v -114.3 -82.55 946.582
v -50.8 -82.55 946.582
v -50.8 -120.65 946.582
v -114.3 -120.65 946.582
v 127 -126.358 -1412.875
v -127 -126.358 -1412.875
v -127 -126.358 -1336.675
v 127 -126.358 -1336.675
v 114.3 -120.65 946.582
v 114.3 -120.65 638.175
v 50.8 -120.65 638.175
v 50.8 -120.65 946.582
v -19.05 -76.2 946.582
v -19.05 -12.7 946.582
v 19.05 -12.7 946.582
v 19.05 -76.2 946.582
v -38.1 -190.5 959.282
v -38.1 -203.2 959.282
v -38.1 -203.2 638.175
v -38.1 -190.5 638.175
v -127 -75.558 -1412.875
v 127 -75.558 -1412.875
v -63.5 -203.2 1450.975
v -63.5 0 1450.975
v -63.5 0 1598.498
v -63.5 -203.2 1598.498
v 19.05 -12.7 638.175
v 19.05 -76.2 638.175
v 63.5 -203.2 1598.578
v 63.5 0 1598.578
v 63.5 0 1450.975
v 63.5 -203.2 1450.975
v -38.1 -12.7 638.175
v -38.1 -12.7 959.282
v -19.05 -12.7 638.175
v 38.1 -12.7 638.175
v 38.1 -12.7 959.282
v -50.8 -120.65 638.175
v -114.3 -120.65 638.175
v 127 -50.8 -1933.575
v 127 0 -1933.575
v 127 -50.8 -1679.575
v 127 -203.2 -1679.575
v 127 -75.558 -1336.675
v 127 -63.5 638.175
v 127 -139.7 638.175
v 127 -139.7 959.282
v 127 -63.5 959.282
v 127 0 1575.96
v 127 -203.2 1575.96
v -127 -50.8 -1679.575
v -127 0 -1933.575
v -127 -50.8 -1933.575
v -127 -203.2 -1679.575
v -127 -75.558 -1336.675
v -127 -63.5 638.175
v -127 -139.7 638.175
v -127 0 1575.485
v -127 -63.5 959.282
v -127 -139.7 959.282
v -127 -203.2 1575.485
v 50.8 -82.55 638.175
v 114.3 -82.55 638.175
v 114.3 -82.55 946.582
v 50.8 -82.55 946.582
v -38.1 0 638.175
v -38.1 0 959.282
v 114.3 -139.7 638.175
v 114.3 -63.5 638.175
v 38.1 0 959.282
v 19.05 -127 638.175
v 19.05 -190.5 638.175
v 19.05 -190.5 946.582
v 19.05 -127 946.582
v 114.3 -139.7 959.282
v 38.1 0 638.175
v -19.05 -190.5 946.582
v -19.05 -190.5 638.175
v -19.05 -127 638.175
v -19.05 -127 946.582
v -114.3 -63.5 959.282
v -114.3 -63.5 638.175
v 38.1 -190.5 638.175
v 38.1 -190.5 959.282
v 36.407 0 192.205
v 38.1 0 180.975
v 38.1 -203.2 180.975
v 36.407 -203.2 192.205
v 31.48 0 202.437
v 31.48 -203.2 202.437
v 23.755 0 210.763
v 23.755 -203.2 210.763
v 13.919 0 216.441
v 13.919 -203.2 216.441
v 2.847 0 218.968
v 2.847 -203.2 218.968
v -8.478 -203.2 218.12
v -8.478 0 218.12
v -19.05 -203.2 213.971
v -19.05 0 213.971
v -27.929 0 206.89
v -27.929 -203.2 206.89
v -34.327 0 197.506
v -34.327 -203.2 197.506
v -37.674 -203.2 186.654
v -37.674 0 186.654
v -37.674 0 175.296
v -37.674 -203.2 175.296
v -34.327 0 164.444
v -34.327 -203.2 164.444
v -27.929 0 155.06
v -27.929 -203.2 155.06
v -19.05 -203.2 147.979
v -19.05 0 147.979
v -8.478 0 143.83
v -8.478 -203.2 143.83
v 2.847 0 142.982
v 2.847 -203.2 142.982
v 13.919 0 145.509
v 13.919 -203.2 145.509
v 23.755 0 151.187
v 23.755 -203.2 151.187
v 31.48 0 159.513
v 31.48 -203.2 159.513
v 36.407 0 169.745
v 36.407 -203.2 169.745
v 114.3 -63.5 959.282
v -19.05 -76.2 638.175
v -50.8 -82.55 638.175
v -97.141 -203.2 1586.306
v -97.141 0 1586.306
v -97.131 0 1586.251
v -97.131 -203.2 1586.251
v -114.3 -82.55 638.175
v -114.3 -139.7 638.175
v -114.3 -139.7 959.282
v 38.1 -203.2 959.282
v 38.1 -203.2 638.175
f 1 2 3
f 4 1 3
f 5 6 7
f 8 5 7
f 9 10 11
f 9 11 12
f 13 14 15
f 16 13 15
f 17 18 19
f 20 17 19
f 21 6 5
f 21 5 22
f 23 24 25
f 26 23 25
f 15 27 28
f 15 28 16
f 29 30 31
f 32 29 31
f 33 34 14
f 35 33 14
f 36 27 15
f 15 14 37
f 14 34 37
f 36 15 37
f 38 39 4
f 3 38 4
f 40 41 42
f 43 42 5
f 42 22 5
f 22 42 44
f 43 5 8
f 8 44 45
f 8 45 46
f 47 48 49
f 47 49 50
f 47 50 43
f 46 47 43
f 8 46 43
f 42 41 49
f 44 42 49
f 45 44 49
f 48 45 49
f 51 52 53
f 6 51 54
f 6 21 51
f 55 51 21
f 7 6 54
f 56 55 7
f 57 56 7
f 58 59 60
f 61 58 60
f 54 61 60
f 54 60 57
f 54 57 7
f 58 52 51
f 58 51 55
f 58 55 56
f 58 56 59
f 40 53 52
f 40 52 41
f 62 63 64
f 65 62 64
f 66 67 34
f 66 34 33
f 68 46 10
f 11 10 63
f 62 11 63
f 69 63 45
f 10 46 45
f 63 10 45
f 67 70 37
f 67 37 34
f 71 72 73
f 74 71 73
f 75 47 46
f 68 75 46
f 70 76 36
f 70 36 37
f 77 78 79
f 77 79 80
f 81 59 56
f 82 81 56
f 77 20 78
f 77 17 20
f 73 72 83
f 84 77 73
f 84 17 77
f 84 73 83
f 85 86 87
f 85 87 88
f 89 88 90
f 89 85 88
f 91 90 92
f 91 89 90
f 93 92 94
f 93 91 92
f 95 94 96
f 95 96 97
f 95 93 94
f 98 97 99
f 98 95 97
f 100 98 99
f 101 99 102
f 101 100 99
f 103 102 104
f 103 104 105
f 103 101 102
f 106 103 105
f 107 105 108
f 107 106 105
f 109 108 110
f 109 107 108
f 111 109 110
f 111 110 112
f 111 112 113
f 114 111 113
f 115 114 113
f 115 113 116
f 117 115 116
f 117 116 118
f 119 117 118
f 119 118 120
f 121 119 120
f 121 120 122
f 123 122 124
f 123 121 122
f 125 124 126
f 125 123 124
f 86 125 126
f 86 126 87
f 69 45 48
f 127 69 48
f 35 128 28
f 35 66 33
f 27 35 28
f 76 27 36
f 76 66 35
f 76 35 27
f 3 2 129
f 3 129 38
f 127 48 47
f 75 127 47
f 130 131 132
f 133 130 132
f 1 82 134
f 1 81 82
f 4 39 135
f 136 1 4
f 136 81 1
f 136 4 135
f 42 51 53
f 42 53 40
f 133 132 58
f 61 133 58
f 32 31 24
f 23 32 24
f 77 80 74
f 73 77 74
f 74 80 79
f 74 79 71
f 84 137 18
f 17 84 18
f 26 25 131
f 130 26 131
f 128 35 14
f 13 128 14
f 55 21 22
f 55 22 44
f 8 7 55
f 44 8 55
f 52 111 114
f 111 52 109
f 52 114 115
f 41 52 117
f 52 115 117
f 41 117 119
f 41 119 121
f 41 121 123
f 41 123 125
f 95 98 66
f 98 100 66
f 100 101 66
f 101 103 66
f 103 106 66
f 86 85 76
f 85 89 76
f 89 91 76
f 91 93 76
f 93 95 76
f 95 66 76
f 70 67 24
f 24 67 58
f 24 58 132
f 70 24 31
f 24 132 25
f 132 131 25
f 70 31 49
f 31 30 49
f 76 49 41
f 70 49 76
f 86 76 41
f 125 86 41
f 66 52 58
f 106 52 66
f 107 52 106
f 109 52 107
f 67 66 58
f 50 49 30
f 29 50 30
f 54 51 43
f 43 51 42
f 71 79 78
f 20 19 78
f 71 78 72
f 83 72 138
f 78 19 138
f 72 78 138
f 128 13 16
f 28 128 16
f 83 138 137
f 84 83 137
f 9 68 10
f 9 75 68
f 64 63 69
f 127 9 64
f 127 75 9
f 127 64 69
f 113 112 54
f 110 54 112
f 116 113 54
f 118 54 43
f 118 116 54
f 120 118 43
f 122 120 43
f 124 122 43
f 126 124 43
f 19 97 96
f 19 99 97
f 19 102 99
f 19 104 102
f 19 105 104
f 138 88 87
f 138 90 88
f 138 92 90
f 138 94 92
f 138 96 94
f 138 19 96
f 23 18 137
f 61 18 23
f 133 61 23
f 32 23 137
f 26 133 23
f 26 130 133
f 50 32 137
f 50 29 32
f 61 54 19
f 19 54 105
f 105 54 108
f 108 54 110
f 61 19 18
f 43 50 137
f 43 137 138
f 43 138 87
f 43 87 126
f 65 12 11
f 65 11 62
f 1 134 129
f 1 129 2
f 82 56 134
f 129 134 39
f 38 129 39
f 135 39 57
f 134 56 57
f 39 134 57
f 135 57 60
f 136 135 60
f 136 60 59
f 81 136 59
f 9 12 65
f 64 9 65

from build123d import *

# Parameters (mm, degrees)
F0_R      = 38.1
F0_W      = 38.1
F0_H      = 308.4068
F1_DEPTH  = 203.2
F2_DEPTH  = 76.2
F3_W      = 38.1
F3_H      = 308.4068
F4_DEPTH  = 76.2
F5_DEPTH  = 12.7
F6_DEPTH  = 12.7
F7_W      = 38.1
F7_H      = 308.4068
F8_DEPTH  = 76.2
F9_DEPTH  = 12.7
F10_W     = 38.1
F10_H     = 308.4068
F11_DEPTH = 76.2
F12_DEPTH = 12.7
F7_W_2    = 50.8
F7_H_2    = 76.2
F13_DEPTH = 254
F14_W     = 254
F14_H     = 50.8
F15_DEPTH = 254


# Not quite as in the source:
# - a feature names something its author has since deleted; it is built from what else it names


with BuildPart() as f1:
    # F0 (on Front) → F1 (new body)
    with BuildSketch(Plane.XZ):
        Polygon((-97.1309603494, 1586.2505768385), (-127, 1575.484752655), (-127, -1679.575), (127, -1679.575), (127, 1575.9600688261), (63.5, 1598.5777378082), (63.5, 1450.975), (-63.5, 1450.975), (-63.5, 1598.4984636307), (-97.1411935326, 1586.3062005624), align=None)
        with Locations((0, 180.975)):
            Circle(F0_R, mode=Mode.SUBTRACT)
        Polygon((19.05, 638.175), (-19.05, 638.175), (-38.1, 638.175), (-38.1, 959.2818), (38.1, 959.2818), (38.1, 638.175), align=None, mode=Mode.SUBTRACT)
        with Locations((0, 792.3784)):
            Rectangle(F0_W, F0_H)
        Polygon((-19.05, 638.175), (-19.05, 946.5818), (19.05, 946.5818), (19.05, 638.175), (38.1, 638.175), (38.1, 959.2818), (-38.1, 959.2818), (-38.1, 638.175), align=None)
    extrude(amount=F1_DEPTH)

    # F0 (on Front) → F2 (cut)
    with BuildSketch(Plane.XZ):
        with Locations((0, 792.3784)):
            Rectangle(F0_W, F0_H)
    extrude(amount=F2_DEPTH, mode=Mode.SUBTRACT)

    # F3 (on face) → F4 (cut)
    with BuildSketch(Plane.XZ.offset(203.2)):
        with Locations((0, 792.3784)):
            Rectangle(F3_W, F3_H)
    extrude(amount=-F4_DEPTH, mode=Mode.SUBTRACT)

    # F3 (on face) → F5 (cut)
    with BuildSketch(Plane.XZ.offset(203.2)):
        Polygon((-38.1, 638.175), (-19.05, 638.175), (-19.05, 946.5818), (19.05, 946.5818), (19.05, 638.175), (38.1, 638.175), (38.1, 959.2818), (-38.1, 959.2818), align=None)
    extrude(amount=-F5_DEPTH, mode=Mode.SUBTRACT)

    # F0 (on Front) → F6 (cut)
    with BuildSketch(Plane.XZ):
        Polygon((-19.05, 638.175), (-19.05, 946.5818), (19.05, 946.5818), (19.05, 638.175), (38.1, 638.175), (38.1, 959.2818), (-38.1, 959.2818), (-38.1, 638.175), align=None)
    extrude(amount=F6_DEPTH, mode=Mode.SUBTRACT)

    # F7 (on face) → F8 (cut)
    with BuildSketch(Plane.YZ.offset(127)):
        with Locations((-101.6, 792.3784)):
            Rectangle(F7_W, F7_H)
    extrude(amount=-F8_DEPTH, mode=Mode.SUBTRACT)

    # F7 (on face) → F9 (cut)
    with BuildSketch(Plane.YZ.offset(127)):
        Polygon((-139.7, 638.175), (-120.65, 638.175), (-120.65, 946.5818), (-82.55, 946.5818), (-82.55, 638.175), (-63.5, 638.175), (-63.5, 959.2818), (-139.7, 959.2818), align=None)
    extrude(amount=-F9_DEPTH, mode=Mode.SUBTRACT)

    # F10 (on face) → F11 (cut)
    with BuildSketch(Plane(origin=(-127, 0, 0), x_dir=(0, -1, 0), z_dir=(-1, 0, 0))):
        with Locations((101.6, 792.3784)):
            Rectangle(F10_W, F10_H)
    extrude(amount=-F11_DEPTH, mode=Mode.SUBTRACT)

    # F10 (on face) → F12 (cut)
    with BuildSketch(Plane(origin=(-127, 0, 0), x_dir=(0, -1, 0), z_dir=(-1, 0, 0))):
        Polygon((63.5, 638.175), (82.55, 638.175), (82.55, 946.5818), (120.65, 946.5818), (120.65, 638.175), (139.7, 638.175), (139.7, 959.2818), (63.5, 959.2818), align=None)
    extrude(amount=-F12_DEPTH, mode=Mode.SUBTRACT)

    # F7 (on face) → F13 (cut)
    with BuildSketch(Plane.YZ.offset(127)):
        with Locations((-100.9582259417, -1374.775)):
            Rectangle(F7_W_2, F7_H_2)
    extrude(amount=-F13_DEPTH, mode=Mode.SUBTRACT)

    # F14 (on face) → F15 (join)
    with BuildSketch(Plane(origin=(0, 0, -1679.575), x_dir=(1, 0, 0), z_dir=(0, 0, -1))):
        with Locations((0, 25.4)):
            Rectangle(F14_W, F14_H)
    extrude(amount=F15_DEPTH)


solid = f1.part
